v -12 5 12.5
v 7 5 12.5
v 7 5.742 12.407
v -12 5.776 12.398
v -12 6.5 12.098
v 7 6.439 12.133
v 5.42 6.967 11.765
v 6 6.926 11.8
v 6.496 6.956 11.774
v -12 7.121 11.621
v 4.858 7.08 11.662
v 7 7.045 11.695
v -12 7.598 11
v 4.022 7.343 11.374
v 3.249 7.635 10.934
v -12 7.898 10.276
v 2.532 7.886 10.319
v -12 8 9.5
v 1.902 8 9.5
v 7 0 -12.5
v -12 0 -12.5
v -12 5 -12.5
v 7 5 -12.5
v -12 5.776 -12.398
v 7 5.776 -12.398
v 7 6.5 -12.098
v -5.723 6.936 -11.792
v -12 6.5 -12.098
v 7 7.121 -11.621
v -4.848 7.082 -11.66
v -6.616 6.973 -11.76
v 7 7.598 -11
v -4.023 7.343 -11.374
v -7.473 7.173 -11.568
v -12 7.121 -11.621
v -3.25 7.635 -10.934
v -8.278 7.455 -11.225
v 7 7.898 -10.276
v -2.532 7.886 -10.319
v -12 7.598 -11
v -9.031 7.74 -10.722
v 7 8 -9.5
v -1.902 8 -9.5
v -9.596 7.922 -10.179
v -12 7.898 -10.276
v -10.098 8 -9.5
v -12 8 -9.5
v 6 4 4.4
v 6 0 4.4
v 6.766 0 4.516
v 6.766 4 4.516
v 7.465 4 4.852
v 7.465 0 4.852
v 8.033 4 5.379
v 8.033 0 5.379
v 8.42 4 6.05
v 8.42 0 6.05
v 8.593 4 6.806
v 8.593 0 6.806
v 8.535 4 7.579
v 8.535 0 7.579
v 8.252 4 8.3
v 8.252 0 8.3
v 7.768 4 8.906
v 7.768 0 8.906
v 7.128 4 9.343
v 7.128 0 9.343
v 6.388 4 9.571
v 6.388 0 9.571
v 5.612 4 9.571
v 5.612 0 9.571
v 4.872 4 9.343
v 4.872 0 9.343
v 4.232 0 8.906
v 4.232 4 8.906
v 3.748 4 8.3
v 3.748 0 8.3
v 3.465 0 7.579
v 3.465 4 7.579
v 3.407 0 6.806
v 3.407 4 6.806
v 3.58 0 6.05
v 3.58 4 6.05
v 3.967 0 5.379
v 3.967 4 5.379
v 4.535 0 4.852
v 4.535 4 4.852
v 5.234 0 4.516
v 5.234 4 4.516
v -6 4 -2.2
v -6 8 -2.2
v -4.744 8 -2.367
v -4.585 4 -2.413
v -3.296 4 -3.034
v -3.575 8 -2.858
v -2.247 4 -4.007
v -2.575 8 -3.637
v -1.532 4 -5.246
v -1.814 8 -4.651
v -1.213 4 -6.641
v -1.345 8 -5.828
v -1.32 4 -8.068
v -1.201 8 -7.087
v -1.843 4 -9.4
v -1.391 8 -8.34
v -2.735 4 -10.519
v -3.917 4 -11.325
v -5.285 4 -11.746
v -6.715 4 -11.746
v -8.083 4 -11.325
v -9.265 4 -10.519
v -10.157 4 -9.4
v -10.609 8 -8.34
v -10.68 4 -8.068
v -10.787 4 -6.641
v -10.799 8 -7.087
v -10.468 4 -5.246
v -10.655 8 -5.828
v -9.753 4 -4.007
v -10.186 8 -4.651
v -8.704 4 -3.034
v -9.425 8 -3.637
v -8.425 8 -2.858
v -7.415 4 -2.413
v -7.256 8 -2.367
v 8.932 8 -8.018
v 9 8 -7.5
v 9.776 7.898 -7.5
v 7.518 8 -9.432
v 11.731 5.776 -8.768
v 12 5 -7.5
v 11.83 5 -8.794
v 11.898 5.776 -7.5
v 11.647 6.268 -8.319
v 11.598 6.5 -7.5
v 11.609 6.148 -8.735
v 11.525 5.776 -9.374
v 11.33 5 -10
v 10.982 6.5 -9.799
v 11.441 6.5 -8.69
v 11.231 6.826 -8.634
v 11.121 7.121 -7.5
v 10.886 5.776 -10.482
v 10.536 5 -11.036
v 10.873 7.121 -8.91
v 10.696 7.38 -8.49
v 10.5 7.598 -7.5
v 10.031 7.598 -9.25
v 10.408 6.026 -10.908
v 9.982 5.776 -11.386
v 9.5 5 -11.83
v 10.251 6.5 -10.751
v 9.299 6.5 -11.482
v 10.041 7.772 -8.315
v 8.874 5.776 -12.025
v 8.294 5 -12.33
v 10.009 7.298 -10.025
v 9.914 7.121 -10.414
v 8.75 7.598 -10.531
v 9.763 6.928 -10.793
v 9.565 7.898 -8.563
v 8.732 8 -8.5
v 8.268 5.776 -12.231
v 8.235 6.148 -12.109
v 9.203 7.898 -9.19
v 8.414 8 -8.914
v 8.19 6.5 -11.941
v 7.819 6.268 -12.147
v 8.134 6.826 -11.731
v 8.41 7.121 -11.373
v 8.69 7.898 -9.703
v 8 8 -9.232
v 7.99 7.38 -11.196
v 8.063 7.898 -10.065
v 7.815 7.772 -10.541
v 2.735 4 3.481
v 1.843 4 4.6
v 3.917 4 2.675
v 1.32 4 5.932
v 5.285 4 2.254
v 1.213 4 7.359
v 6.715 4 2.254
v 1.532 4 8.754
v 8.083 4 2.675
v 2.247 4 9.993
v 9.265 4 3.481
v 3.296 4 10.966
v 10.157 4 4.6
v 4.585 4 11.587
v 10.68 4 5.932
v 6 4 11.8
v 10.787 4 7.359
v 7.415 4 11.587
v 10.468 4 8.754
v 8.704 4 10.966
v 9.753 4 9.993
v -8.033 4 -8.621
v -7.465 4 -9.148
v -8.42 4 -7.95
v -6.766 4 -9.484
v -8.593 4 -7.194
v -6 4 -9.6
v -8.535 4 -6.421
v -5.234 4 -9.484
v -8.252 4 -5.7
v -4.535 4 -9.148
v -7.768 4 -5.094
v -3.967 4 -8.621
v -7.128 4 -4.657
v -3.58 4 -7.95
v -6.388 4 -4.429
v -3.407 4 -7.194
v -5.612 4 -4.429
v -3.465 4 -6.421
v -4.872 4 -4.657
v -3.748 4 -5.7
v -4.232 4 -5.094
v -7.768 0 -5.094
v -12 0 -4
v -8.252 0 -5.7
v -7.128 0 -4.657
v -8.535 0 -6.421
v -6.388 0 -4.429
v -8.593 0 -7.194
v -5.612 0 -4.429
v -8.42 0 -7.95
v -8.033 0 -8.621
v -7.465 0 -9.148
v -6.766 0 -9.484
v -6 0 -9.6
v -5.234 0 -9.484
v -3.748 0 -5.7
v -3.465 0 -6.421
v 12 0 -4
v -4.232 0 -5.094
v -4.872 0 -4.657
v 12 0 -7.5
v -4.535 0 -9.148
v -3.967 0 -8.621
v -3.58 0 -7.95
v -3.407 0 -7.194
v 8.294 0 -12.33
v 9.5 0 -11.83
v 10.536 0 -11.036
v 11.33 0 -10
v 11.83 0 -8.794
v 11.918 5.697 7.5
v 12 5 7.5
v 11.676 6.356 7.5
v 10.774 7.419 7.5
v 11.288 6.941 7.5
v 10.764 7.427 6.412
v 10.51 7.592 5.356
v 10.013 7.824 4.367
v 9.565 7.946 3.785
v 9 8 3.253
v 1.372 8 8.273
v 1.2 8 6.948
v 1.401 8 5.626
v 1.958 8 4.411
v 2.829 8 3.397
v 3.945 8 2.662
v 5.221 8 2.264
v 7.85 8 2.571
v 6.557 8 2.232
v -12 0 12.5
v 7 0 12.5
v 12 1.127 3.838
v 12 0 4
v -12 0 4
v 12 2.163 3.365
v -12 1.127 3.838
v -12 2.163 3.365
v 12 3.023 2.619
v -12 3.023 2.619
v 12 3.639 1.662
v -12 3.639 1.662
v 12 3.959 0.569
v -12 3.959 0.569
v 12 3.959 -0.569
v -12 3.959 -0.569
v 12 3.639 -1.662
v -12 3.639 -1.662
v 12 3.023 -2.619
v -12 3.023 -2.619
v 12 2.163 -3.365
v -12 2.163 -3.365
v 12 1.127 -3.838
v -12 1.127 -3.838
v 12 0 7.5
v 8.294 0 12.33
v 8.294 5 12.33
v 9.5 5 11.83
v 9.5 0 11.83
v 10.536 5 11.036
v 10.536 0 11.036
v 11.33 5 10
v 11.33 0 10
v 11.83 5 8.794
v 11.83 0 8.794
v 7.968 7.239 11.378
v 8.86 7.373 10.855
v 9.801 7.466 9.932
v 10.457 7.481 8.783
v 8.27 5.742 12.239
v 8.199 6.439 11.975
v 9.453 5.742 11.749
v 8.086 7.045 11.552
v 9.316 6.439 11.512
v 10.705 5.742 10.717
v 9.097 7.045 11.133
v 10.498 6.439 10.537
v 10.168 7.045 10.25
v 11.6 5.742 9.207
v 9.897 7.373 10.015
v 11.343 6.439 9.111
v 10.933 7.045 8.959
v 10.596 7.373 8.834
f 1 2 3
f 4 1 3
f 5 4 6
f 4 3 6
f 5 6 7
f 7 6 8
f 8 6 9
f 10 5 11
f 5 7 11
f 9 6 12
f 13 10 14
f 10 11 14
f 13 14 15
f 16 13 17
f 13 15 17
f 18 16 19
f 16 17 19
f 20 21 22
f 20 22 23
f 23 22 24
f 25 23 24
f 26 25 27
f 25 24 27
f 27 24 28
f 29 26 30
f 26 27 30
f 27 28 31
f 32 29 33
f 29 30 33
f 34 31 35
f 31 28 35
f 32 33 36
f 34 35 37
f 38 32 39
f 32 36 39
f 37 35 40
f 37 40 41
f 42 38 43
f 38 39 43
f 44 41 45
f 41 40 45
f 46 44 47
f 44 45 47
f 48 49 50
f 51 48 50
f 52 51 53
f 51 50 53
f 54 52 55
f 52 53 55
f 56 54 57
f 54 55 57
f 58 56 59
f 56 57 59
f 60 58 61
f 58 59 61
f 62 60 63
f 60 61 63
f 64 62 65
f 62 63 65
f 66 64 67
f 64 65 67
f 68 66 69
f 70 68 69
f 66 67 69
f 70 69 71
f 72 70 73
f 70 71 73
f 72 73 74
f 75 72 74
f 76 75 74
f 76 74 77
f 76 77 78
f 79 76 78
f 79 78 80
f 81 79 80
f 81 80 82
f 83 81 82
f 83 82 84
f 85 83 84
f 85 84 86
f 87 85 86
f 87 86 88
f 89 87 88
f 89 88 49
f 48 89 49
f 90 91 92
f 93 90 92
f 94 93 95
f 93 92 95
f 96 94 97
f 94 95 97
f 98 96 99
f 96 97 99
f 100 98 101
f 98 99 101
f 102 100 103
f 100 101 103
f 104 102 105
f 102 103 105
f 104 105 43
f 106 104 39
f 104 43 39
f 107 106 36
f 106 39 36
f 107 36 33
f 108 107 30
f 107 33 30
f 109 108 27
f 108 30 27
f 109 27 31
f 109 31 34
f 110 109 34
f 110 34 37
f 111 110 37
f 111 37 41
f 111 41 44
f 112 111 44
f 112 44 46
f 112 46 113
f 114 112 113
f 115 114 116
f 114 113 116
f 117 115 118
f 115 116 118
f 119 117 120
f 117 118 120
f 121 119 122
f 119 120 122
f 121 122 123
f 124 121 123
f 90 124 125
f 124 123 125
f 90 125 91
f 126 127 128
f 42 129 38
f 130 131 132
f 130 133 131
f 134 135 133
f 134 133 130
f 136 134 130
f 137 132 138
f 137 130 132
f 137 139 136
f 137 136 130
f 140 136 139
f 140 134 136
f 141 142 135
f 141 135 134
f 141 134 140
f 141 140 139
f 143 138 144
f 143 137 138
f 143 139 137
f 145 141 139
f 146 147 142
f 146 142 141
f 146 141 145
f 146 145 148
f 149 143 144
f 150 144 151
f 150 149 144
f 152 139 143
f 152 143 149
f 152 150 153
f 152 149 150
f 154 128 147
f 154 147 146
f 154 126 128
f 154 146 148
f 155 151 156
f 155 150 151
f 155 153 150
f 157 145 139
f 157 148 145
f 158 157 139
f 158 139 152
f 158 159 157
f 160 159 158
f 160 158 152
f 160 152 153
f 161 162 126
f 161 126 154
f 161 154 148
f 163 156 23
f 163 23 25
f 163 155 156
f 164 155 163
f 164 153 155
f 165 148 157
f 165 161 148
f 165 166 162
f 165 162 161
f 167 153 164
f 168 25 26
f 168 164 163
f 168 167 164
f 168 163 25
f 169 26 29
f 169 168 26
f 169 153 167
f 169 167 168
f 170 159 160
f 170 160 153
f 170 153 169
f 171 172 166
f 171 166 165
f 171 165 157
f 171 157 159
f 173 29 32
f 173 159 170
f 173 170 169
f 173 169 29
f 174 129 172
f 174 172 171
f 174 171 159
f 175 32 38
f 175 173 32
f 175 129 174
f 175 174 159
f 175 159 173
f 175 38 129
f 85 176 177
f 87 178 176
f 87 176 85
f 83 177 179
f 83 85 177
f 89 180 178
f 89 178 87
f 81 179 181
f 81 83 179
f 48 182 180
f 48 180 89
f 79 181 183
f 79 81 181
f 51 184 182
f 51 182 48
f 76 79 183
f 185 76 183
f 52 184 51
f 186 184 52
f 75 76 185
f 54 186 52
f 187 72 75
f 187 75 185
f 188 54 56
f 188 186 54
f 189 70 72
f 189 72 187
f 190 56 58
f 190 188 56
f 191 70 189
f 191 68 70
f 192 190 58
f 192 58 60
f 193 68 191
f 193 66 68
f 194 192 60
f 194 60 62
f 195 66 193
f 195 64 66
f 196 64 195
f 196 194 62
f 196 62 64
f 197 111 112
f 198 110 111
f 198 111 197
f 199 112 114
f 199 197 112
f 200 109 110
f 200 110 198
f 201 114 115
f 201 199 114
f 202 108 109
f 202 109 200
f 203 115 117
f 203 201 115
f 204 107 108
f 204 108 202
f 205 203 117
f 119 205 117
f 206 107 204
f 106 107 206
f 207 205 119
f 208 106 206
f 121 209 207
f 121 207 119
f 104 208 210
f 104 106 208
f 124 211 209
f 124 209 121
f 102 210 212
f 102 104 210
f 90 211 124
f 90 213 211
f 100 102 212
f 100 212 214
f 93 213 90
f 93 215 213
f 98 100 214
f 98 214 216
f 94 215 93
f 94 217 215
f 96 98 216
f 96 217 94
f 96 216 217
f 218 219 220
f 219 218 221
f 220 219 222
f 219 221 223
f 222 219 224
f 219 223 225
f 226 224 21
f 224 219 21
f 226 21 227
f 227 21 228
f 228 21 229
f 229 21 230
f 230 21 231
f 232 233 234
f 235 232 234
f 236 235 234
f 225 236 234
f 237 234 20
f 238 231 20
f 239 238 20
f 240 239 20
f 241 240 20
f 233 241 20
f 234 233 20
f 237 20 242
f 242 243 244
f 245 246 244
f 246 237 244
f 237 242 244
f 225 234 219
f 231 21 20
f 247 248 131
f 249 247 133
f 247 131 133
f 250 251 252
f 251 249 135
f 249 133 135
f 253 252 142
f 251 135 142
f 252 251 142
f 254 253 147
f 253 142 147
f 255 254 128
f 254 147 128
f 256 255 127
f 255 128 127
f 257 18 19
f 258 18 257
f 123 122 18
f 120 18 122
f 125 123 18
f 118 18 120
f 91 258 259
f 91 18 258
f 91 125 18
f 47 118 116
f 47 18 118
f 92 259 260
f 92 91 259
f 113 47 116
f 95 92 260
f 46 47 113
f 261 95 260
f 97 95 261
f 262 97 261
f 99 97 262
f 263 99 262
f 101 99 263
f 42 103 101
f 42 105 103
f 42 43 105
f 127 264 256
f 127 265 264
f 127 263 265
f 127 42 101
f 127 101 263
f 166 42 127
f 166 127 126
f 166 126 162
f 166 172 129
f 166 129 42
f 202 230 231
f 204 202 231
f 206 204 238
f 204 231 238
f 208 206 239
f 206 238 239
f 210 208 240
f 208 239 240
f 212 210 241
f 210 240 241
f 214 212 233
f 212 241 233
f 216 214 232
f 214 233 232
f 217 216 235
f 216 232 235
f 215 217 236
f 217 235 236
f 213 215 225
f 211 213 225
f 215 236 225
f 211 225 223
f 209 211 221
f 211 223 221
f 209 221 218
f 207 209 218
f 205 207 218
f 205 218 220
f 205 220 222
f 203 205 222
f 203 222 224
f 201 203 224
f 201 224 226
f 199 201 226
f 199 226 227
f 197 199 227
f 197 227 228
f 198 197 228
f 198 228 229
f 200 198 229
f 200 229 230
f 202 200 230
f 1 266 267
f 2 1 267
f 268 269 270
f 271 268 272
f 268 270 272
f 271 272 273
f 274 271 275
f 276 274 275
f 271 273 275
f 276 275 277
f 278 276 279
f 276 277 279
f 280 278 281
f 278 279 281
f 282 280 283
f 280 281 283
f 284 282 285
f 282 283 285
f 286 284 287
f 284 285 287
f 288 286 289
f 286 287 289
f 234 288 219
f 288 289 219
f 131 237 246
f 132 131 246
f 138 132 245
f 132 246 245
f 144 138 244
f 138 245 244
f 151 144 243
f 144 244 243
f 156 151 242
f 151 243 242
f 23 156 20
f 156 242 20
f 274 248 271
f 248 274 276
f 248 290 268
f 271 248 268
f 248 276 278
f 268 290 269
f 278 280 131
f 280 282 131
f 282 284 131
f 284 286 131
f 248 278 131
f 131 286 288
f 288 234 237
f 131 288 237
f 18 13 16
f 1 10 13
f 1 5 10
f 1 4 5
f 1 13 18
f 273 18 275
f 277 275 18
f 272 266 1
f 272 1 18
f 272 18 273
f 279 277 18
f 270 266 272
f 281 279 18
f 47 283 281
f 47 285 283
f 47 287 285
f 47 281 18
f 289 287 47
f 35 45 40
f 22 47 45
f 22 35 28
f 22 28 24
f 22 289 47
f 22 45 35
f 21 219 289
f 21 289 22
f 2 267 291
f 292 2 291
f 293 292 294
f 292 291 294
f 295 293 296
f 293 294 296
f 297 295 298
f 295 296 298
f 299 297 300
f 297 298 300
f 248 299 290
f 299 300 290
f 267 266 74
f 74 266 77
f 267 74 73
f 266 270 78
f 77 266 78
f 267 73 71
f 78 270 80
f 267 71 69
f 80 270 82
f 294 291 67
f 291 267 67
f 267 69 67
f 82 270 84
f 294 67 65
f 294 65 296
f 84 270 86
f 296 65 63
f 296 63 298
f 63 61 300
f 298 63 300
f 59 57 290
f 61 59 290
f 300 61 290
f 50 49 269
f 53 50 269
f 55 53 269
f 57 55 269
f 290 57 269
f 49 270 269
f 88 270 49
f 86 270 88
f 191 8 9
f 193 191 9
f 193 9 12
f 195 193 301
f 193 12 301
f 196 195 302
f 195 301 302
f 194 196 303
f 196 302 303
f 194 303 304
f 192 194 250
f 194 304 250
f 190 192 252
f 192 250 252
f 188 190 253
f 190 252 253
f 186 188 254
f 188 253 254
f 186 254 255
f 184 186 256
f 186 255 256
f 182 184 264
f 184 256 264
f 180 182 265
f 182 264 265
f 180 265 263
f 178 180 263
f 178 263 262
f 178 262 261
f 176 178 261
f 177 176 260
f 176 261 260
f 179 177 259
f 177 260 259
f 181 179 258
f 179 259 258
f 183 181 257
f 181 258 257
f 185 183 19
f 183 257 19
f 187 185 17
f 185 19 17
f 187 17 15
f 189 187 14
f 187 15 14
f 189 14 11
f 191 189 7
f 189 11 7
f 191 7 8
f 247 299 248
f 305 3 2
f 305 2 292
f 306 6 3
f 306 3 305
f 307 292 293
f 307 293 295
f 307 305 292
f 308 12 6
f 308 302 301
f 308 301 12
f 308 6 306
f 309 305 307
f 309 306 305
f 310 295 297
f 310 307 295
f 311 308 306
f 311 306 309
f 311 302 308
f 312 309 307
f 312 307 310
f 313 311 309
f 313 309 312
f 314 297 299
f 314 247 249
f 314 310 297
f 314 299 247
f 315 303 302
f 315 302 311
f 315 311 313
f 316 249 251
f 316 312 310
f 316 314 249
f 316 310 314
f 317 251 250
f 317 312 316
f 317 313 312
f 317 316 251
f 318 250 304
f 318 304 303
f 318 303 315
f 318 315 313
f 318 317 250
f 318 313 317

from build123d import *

# Parameters (mm, degrees)
SKETCH1_W           = 24
SKETCH1_H           = 25
BOSS_EXTRUDE1_DEPTH = 8
SKETCH2_R           = 4
CUT_EXTRUDE1_DEPTH  = 29.217902119
SKETCH3_R           = 2.6
CUT_EXTRUDE2_DEPTH  = 20.085334684
FILLET1_R           = 3
FILLET2_R           = 5
SKETCH4_R           = 4.8
CUT_EXTRUDE3_DEPTH  = 4


with BuildPart() as part:
    # Sketch1 → Boss-Extrude1 (new body)
    with BuildSketch(Plane(origin=(0, 0, 0), x_dir=(1, 0, 0), z_dir=(0, 1, 0))):
        Rectangle(SKETCH1_W, SKETCH1_H)
    extrude(amount=BOSS_EXTRUDE1_DEPTH)

    # Sketch2 → Cut-Extrude1 (cut, through all)
    with BuildSketch(Plane.ZY.offset(12)):
        Circle(SKETCH2_R)
    extrude(amount=-CUT_EXTRUDE1_DEPTH, mode=Mode.SUBTRACT)

    # Sketch3 → Cut-Extrude2 (cut, through all)
    with BuildSketch(Plane.XZ):
        with Locations(Location((-6, -7, 0), (0, 0, 270))):
            Circle(SKETCH3_R)
        with Locations(Location((6, 7, 0), (0, 0, 270))):
            Circle(SKETCH3_R)
    extrude(amount=-CUT_EXTRUDE2_DEPTH, mode=Mode.SUBTRACT)

    # Fillet1
    # the kernel refuses this fillet: 3 mm, written as the material it takes off along each edge
    with BuildSketch(Plane(origin=(19.5, 8, 12.5), x_dir=(0, 0, -1), z_dir=(-1, 0, 0))) as fillet1_piece_1:
        with BuildLine():
            CenterArc((FILLET1_R, FILLET1_R), FILLET1_R, 180, 90)
            Line((0, FILLET1_R), (0, 0))
            Line((0, 0), (FILLET1_R, 0))
        make_face()
    extrude(amount=39, mode=Mode.SUBTRACT)
    with BuildSketch(Plane(origin=(12, 8, -20), x_dir=(0, -1, 0), z_dir=(0, 0, 1))) as fillet1_piece_2:
        with BuildLine():
            CenterArc((FILLET1_R, -FILLET1_R), FILLET1_R, 90, 90)
            Line((0, -FILLET1_R), (0, 0))
            Line((0, 0), (FILLET1_R, 0))
        make_face()
    extrude(amount=40, mode=Mode.SUBTRACT)
    with BuildSketch(Plane(origin=(-19.5, 8, -12.5), x_dir=(0, -1, 0), z_dir=(1, 0, 0))) as fillet1_piece_3:
        with BuildLine():
            CenterArc((FILLET1_R, -FILLET1_R), FILLET1_R, 90, 90)
            Line((0, -FILLET1_R), (0, 0))
            Line((0, 0), (FILLET1_R, 0))
        make_face()
    extrude(amount=39, mode=Mode.SUBTRACT)

    # Fillet2
    # the kernel refuses this fillet: 5 mm, written as the material it takes off along each edge
    with BuildSketch(Plane(origin=(7, 8, 7.5), x_dir=(0, 0, 1), z_dir=(-1, 0, 0))) as fillet2_piece_1:
        with BuildLine():
            CenterArc((2, -3), 3, 0, 90)
            Line((5, -3), (5, 0))
            Line((5, 0), (2, 0))
        make_face()
    revolve(axis=Axis((7, 8, 7.5), (0, 1, 0)), revolution_arc=90, mode=Mode.SUBTRACT)
    with BuildSketch(Plane(origin=(7, 8, -7.5), x_dir=(1, 0, 0), z_dir=(0, 0, 1))) as fillet2_piece_2:
        with BuildLine():
            CenterArc((2, -3), 3, 0, 90)
            Line((5, -3), (5, 0))
            Line((5, 0), (2, 0))
        make_face()
    revolve(axis=Axis((7, 8, -7.5), (0, 1, 0)), revolution_arc=90, mode=Mode.SUBTRACT)
    with BuildSketch(Plane(origin=(12, -12.5, -12.5), x_dir=(-1, 0, 0), z_dir=(0, 1, 0)), Plane(origin=(12, -12.5, 12.5), x_dir=(0, 0, -1), z_dir=(0, 1, 0))) as fillet2_piece_3:
        with BuildLine():
            CenterArc((FILLET2_R, FILLET2_R), FILLET2_R, 180, 90)
            Line((0, FILLET2_R), (0, 0))
            Line((0, 0), (FILLET2_R, 0))
        make_face()
    extrude(amount=20.5, mode=Mode.SUBTRACT)

    # Sketch4 → Cut-Extrude3 (cut)
    with BuildSketch(Plane(origin=(0, 8, 0), x_dir=(1, 0, 0), z_dir=(0, 1, 0))):
        with Locations(Location((-6, 7, 0), (0, 0, 270))):
            Circle(SKETCH4_R)
        with Locations(Location((6, -7, 0), (0, 0, 270))):
            Circle(SKETCH4_R)
    extrude(amount=-CUT_EXTRUDE3_DEPTH, mode=Mode.SUBTRACT)


solid = part.part
